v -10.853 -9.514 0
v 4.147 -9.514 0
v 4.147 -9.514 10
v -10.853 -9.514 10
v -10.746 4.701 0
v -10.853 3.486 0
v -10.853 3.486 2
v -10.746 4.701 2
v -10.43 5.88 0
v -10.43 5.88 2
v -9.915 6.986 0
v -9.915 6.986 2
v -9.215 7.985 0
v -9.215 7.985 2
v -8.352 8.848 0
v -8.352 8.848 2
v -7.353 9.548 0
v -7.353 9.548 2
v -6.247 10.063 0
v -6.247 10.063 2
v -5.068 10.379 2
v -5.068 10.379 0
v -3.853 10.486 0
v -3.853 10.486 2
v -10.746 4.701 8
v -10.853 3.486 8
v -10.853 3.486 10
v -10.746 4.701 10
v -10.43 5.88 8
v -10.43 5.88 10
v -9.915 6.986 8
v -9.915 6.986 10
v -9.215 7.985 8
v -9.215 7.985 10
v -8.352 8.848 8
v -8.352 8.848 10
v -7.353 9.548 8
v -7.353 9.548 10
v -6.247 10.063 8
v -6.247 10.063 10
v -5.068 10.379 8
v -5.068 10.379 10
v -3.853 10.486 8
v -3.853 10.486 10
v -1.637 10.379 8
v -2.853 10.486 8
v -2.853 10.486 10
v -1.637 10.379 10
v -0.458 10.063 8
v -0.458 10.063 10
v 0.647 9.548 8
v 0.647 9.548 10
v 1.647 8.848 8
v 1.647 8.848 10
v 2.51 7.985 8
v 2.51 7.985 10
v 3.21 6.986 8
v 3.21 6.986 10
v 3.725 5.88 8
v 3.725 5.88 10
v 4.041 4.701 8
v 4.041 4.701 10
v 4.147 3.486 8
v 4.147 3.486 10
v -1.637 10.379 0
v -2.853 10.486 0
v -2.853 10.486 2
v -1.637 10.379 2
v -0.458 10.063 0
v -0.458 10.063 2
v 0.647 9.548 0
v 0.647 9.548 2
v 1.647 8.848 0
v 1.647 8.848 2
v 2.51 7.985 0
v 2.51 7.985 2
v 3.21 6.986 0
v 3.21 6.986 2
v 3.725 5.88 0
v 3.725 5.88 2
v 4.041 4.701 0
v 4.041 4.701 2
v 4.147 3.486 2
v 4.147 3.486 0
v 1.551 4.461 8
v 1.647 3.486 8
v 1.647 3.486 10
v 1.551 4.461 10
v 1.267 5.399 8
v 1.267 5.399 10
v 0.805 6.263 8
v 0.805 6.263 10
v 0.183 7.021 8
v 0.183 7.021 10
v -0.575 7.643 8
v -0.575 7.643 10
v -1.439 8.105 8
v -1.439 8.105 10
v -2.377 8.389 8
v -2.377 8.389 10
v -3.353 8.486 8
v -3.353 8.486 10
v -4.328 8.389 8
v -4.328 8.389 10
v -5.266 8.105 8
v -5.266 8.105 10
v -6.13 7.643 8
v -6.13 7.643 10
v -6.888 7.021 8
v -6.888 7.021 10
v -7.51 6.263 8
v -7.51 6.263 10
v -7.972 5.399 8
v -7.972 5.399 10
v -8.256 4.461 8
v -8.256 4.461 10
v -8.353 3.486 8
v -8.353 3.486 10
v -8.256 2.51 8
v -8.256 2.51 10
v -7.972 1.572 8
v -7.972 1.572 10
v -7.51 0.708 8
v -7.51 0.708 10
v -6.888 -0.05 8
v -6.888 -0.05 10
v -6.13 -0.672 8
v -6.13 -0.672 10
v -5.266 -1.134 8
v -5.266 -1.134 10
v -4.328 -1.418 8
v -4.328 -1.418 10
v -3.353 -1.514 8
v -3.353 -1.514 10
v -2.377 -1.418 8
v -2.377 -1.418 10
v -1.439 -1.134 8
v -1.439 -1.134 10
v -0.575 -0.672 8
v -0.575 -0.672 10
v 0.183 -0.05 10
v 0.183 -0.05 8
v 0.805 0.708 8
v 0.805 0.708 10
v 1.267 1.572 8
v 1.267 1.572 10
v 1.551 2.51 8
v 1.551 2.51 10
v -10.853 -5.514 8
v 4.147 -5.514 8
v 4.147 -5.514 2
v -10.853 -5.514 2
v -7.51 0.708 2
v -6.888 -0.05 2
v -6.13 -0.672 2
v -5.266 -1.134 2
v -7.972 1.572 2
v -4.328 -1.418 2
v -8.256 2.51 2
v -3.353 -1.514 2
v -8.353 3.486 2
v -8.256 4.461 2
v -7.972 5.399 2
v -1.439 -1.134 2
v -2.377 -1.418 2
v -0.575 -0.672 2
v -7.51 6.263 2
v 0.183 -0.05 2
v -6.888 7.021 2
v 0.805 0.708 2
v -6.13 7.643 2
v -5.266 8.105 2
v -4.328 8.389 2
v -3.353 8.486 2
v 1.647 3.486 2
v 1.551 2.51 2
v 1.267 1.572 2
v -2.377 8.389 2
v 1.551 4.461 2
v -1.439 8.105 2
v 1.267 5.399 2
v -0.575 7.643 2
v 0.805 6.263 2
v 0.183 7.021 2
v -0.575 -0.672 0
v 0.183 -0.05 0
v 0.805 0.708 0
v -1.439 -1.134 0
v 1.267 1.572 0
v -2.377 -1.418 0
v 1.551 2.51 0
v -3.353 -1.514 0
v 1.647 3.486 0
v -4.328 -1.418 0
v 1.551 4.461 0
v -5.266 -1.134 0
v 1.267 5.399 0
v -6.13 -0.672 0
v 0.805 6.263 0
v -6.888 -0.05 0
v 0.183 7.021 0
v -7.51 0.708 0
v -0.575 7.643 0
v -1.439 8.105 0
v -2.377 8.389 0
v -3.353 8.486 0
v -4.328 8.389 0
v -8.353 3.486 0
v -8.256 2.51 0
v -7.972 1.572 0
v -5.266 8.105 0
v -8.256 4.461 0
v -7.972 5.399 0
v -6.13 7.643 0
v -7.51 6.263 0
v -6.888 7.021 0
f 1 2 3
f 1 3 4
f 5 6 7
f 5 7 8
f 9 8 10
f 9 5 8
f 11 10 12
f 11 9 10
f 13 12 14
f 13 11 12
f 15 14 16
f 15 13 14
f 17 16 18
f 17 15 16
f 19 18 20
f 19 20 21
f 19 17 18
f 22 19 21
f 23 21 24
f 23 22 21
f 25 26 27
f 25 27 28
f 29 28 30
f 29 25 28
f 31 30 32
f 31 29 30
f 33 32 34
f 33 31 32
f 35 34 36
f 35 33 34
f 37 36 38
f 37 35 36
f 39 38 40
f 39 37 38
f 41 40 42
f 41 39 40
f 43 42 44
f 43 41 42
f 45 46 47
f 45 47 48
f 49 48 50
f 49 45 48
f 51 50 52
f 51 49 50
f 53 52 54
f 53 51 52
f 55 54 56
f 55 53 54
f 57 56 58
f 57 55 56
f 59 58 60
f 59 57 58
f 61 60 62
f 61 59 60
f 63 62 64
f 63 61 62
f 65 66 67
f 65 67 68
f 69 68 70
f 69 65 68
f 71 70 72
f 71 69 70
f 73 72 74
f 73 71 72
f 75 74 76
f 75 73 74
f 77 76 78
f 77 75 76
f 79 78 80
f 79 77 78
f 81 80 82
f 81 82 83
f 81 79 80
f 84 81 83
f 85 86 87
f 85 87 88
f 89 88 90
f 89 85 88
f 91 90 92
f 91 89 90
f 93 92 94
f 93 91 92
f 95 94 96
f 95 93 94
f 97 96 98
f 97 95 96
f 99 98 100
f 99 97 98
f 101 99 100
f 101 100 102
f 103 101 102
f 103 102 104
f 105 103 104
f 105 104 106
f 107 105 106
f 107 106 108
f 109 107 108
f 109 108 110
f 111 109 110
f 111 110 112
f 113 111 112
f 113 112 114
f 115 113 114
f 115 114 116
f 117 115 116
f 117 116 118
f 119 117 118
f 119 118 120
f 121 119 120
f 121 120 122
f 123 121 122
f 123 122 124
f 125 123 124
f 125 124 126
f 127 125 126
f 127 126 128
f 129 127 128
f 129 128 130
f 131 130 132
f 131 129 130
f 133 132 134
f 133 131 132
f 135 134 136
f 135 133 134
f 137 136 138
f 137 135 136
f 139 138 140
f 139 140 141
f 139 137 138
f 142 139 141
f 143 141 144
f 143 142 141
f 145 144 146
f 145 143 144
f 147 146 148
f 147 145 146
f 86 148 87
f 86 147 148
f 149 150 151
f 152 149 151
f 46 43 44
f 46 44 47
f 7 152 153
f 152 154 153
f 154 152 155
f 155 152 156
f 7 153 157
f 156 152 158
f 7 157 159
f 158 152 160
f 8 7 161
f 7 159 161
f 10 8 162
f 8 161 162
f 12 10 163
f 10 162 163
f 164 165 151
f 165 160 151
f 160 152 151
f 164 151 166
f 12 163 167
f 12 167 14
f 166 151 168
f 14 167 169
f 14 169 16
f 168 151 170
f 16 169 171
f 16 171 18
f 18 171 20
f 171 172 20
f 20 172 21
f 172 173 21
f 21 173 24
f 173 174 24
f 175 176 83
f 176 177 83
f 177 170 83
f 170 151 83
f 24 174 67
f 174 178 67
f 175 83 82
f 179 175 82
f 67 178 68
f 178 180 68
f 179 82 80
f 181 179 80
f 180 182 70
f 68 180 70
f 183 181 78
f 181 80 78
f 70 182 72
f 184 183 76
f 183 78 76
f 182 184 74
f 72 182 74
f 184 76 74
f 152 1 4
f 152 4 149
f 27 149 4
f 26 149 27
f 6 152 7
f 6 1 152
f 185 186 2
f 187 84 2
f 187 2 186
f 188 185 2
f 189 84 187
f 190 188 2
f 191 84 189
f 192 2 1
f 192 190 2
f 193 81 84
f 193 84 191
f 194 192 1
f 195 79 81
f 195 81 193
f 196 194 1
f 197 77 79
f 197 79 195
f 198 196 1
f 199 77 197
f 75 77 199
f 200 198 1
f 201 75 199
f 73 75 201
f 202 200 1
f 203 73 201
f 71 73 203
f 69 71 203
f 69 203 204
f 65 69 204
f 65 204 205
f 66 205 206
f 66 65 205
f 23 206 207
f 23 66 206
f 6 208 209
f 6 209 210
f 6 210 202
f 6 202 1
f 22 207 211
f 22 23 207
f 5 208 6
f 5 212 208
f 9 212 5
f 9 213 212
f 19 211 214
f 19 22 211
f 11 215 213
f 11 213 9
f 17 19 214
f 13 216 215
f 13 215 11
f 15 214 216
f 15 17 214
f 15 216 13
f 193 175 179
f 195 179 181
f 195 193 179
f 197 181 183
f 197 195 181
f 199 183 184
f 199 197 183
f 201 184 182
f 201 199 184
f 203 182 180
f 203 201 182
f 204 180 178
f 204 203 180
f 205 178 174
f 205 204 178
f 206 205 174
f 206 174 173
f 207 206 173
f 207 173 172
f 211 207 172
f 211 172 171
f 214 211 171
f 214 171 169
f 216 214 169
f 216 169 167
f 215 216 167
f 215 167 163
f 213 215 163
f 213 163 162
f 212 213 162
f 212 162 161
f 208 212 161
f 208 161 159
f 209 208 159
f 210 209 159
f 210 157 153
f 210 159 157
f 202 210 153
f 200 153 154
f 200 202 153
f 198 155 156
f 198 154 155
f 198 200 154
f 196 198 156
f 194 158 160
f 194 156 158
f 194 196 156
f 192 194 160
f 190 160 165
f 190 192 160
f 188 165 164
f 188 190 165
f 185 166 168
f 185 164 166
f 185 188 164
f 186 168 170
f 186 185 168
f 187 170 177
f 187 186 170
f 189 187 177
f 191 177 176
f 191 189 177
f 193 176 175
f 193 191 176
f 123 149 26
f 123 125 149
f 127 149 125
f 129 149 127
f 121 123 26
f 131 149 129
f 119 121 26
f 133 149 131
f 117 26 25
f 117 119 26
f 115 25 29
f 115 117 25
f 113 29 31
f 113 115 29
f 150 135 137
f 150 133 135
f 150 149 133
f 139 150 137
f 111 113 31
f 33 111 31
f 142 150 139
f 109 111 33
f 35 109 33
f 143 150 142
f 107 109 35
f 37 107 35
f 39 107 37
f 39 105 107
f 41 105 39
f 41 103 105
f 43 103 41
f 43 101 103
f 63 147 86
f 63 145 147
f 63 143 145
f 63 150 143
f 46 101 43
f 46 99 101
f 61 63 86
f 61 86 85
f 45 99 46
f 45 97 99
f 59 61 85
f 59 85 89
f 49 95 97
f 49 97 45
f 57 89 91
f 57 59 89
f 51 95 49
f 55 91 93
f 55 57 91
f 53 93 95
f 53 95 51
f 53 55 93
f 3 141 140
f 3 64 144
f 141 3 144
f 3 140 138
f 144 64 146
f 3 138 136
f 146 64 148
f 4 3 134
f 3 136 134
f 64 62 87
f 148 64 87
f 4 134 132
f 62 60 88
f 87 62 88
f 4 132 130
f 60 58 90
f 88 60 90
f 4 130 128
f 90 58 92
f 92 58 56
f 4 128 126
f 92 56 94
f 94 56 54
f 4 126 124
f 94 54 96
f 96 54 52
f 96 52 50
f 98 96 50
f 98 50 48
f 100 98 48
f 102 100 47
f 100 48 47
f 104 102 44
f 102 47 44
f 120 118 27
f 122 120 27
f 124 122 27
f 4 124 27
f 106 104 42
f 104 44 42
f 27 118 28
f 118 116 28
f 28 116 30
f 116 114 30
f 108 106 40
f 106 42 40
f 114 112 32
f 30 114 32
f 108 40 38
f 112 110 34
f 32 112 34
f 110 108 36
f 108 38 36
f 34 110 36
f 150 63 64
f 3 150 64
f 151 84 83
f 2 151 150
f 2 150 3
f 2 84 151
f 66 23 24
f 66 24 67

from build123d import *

# Parameters (mm, degrees)
CROQUIS1_R              = 5
SALIENTE_EXTRUIR1_DEPTH = 10
CROQUIS2_W              = 6
CROQUIS2_H              = 16
CORTAR_EXTRUIR1_DEPTH   = 16


with BuildPart() as part:
    # Croquis1 → Saliente-Extruir1 (new body)
    with BuildSketch(Plane.XY):
        with BuildLine():
            Line((-3.852526449, 10.48553719), (-2.852526449, 10.48553719))
            ThreePointArc((-2.852526449, 10.48553719), (2.097221019, 8.435284658), (4.147473551, 3.48553719))
            Line((4.147473551, 3.48553719), (4.147473551, -9.51446281))
            Line((4.147473551, -9.51446281), (-10.852526449, -9.51446281))
            Line((-10.852526449, -9.51446281), (-10.852526449, 3.48553719))
            ThreePointArc((-10.852526449, 3.48553719), (-8.802273917, 8.435284658), (-3.852526449, 10.48553719))
        make_face()
        with Locations((-3.352526449, 3.48553719)):
            Circle(CROQUIS1_R, mode=Mode.SUBTRACT)
    extrude(amount=SALIENTE_EXTRUIR1_DEPTH)

    # Croquis2 → Cortar-Extruir1 (cut, through all)
    with BuildSketch(Plane(origin=(4.147473551, 0, 0), x_dir=(0, 0, -1), z_dir=(1, 0, 0))):
        with Locations((-5, 2.48553719)):
            Rectangle(CROQUIS2_W, CROQUIS2_H)
    extrude(amount=-CORTAR_EXTRUIR1_DEPTH, mode=Mode.SUBTRACT)


solid = part.part
